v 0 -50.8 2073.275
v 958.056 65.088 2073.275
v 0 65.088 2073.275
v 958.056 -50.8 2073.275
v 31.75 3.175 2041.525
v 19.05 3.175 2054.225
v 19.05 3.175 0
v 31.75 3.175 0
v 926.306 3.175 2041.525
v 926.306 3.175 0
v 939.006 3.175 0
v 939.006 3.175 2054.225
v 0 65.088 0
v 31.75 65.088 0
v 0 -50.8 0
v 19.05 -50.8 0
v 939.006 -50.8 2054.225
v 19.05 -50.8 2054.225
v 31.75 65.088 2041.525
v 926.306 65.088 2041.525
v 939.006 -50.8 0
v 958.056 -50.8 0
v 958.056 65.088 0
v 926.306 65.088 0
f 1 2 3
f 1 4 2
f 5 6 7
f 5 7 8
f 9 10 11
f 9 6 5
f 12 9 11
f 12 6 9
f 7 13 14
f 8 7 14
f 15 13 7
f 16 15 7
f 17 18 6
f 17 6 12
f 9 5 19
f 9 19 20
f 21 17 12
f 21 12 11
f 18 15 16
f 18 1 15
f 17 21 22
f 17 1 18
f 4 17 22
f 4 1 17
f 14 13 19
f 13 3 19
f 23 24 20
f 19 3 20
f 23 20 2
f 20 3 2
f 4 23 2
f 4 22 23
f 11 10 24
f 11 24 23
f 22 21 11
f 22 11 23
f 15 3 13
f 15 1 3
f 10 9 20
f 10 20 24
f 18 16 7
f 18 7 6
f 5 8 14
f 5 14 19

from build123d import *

# Parameters (mm, degrees)
F3_DEPTH      = 61.9125
F5_DEPTH      = 50.8
F5_DEPTH_BACK = 3.175


with BuildPart() as f3:
    # F2 (on offset) → F3 (new body)
    with BuildSketch(Plane.XZ.offset(-3.175)):
        Polygon((0, 2054.225), (0, 0), (19.05, 0), (31.75, 0), (31.75, 2041.525), (926.30625, 2041.525), (926.30625, 0), (939.00625, 0), (958.05625, 0), (958.05625, 2054.225), (958.05625, 2073.275), (0, 2073.275), align=None)
    extrude(amount=-F3_DEPTH)

    # F4 (on Front) → F5 (join, two sides)
    with BuildSketch(Plane.XZ) as f5_sk:
        Polygon((0, 2054.225), (0, 0), (19.05, 0), (19.05, 2041.525), (19.05, 2054.225), (364.33125, 2054.225), (593.725, 2054.225), (939.00625, 2054.225), (939.00625, 2041.525), (939.00625, 0), (958.05625, 0), (958.05625, 2054.225), (958.05625, 2073.275), (0, 2073.275), align=None)
    extrude(amount=F5_DEPTH)
    extrude(f5_sk.sketch, amount=-F5_DEPTH_BACK)


solid = f3.part
